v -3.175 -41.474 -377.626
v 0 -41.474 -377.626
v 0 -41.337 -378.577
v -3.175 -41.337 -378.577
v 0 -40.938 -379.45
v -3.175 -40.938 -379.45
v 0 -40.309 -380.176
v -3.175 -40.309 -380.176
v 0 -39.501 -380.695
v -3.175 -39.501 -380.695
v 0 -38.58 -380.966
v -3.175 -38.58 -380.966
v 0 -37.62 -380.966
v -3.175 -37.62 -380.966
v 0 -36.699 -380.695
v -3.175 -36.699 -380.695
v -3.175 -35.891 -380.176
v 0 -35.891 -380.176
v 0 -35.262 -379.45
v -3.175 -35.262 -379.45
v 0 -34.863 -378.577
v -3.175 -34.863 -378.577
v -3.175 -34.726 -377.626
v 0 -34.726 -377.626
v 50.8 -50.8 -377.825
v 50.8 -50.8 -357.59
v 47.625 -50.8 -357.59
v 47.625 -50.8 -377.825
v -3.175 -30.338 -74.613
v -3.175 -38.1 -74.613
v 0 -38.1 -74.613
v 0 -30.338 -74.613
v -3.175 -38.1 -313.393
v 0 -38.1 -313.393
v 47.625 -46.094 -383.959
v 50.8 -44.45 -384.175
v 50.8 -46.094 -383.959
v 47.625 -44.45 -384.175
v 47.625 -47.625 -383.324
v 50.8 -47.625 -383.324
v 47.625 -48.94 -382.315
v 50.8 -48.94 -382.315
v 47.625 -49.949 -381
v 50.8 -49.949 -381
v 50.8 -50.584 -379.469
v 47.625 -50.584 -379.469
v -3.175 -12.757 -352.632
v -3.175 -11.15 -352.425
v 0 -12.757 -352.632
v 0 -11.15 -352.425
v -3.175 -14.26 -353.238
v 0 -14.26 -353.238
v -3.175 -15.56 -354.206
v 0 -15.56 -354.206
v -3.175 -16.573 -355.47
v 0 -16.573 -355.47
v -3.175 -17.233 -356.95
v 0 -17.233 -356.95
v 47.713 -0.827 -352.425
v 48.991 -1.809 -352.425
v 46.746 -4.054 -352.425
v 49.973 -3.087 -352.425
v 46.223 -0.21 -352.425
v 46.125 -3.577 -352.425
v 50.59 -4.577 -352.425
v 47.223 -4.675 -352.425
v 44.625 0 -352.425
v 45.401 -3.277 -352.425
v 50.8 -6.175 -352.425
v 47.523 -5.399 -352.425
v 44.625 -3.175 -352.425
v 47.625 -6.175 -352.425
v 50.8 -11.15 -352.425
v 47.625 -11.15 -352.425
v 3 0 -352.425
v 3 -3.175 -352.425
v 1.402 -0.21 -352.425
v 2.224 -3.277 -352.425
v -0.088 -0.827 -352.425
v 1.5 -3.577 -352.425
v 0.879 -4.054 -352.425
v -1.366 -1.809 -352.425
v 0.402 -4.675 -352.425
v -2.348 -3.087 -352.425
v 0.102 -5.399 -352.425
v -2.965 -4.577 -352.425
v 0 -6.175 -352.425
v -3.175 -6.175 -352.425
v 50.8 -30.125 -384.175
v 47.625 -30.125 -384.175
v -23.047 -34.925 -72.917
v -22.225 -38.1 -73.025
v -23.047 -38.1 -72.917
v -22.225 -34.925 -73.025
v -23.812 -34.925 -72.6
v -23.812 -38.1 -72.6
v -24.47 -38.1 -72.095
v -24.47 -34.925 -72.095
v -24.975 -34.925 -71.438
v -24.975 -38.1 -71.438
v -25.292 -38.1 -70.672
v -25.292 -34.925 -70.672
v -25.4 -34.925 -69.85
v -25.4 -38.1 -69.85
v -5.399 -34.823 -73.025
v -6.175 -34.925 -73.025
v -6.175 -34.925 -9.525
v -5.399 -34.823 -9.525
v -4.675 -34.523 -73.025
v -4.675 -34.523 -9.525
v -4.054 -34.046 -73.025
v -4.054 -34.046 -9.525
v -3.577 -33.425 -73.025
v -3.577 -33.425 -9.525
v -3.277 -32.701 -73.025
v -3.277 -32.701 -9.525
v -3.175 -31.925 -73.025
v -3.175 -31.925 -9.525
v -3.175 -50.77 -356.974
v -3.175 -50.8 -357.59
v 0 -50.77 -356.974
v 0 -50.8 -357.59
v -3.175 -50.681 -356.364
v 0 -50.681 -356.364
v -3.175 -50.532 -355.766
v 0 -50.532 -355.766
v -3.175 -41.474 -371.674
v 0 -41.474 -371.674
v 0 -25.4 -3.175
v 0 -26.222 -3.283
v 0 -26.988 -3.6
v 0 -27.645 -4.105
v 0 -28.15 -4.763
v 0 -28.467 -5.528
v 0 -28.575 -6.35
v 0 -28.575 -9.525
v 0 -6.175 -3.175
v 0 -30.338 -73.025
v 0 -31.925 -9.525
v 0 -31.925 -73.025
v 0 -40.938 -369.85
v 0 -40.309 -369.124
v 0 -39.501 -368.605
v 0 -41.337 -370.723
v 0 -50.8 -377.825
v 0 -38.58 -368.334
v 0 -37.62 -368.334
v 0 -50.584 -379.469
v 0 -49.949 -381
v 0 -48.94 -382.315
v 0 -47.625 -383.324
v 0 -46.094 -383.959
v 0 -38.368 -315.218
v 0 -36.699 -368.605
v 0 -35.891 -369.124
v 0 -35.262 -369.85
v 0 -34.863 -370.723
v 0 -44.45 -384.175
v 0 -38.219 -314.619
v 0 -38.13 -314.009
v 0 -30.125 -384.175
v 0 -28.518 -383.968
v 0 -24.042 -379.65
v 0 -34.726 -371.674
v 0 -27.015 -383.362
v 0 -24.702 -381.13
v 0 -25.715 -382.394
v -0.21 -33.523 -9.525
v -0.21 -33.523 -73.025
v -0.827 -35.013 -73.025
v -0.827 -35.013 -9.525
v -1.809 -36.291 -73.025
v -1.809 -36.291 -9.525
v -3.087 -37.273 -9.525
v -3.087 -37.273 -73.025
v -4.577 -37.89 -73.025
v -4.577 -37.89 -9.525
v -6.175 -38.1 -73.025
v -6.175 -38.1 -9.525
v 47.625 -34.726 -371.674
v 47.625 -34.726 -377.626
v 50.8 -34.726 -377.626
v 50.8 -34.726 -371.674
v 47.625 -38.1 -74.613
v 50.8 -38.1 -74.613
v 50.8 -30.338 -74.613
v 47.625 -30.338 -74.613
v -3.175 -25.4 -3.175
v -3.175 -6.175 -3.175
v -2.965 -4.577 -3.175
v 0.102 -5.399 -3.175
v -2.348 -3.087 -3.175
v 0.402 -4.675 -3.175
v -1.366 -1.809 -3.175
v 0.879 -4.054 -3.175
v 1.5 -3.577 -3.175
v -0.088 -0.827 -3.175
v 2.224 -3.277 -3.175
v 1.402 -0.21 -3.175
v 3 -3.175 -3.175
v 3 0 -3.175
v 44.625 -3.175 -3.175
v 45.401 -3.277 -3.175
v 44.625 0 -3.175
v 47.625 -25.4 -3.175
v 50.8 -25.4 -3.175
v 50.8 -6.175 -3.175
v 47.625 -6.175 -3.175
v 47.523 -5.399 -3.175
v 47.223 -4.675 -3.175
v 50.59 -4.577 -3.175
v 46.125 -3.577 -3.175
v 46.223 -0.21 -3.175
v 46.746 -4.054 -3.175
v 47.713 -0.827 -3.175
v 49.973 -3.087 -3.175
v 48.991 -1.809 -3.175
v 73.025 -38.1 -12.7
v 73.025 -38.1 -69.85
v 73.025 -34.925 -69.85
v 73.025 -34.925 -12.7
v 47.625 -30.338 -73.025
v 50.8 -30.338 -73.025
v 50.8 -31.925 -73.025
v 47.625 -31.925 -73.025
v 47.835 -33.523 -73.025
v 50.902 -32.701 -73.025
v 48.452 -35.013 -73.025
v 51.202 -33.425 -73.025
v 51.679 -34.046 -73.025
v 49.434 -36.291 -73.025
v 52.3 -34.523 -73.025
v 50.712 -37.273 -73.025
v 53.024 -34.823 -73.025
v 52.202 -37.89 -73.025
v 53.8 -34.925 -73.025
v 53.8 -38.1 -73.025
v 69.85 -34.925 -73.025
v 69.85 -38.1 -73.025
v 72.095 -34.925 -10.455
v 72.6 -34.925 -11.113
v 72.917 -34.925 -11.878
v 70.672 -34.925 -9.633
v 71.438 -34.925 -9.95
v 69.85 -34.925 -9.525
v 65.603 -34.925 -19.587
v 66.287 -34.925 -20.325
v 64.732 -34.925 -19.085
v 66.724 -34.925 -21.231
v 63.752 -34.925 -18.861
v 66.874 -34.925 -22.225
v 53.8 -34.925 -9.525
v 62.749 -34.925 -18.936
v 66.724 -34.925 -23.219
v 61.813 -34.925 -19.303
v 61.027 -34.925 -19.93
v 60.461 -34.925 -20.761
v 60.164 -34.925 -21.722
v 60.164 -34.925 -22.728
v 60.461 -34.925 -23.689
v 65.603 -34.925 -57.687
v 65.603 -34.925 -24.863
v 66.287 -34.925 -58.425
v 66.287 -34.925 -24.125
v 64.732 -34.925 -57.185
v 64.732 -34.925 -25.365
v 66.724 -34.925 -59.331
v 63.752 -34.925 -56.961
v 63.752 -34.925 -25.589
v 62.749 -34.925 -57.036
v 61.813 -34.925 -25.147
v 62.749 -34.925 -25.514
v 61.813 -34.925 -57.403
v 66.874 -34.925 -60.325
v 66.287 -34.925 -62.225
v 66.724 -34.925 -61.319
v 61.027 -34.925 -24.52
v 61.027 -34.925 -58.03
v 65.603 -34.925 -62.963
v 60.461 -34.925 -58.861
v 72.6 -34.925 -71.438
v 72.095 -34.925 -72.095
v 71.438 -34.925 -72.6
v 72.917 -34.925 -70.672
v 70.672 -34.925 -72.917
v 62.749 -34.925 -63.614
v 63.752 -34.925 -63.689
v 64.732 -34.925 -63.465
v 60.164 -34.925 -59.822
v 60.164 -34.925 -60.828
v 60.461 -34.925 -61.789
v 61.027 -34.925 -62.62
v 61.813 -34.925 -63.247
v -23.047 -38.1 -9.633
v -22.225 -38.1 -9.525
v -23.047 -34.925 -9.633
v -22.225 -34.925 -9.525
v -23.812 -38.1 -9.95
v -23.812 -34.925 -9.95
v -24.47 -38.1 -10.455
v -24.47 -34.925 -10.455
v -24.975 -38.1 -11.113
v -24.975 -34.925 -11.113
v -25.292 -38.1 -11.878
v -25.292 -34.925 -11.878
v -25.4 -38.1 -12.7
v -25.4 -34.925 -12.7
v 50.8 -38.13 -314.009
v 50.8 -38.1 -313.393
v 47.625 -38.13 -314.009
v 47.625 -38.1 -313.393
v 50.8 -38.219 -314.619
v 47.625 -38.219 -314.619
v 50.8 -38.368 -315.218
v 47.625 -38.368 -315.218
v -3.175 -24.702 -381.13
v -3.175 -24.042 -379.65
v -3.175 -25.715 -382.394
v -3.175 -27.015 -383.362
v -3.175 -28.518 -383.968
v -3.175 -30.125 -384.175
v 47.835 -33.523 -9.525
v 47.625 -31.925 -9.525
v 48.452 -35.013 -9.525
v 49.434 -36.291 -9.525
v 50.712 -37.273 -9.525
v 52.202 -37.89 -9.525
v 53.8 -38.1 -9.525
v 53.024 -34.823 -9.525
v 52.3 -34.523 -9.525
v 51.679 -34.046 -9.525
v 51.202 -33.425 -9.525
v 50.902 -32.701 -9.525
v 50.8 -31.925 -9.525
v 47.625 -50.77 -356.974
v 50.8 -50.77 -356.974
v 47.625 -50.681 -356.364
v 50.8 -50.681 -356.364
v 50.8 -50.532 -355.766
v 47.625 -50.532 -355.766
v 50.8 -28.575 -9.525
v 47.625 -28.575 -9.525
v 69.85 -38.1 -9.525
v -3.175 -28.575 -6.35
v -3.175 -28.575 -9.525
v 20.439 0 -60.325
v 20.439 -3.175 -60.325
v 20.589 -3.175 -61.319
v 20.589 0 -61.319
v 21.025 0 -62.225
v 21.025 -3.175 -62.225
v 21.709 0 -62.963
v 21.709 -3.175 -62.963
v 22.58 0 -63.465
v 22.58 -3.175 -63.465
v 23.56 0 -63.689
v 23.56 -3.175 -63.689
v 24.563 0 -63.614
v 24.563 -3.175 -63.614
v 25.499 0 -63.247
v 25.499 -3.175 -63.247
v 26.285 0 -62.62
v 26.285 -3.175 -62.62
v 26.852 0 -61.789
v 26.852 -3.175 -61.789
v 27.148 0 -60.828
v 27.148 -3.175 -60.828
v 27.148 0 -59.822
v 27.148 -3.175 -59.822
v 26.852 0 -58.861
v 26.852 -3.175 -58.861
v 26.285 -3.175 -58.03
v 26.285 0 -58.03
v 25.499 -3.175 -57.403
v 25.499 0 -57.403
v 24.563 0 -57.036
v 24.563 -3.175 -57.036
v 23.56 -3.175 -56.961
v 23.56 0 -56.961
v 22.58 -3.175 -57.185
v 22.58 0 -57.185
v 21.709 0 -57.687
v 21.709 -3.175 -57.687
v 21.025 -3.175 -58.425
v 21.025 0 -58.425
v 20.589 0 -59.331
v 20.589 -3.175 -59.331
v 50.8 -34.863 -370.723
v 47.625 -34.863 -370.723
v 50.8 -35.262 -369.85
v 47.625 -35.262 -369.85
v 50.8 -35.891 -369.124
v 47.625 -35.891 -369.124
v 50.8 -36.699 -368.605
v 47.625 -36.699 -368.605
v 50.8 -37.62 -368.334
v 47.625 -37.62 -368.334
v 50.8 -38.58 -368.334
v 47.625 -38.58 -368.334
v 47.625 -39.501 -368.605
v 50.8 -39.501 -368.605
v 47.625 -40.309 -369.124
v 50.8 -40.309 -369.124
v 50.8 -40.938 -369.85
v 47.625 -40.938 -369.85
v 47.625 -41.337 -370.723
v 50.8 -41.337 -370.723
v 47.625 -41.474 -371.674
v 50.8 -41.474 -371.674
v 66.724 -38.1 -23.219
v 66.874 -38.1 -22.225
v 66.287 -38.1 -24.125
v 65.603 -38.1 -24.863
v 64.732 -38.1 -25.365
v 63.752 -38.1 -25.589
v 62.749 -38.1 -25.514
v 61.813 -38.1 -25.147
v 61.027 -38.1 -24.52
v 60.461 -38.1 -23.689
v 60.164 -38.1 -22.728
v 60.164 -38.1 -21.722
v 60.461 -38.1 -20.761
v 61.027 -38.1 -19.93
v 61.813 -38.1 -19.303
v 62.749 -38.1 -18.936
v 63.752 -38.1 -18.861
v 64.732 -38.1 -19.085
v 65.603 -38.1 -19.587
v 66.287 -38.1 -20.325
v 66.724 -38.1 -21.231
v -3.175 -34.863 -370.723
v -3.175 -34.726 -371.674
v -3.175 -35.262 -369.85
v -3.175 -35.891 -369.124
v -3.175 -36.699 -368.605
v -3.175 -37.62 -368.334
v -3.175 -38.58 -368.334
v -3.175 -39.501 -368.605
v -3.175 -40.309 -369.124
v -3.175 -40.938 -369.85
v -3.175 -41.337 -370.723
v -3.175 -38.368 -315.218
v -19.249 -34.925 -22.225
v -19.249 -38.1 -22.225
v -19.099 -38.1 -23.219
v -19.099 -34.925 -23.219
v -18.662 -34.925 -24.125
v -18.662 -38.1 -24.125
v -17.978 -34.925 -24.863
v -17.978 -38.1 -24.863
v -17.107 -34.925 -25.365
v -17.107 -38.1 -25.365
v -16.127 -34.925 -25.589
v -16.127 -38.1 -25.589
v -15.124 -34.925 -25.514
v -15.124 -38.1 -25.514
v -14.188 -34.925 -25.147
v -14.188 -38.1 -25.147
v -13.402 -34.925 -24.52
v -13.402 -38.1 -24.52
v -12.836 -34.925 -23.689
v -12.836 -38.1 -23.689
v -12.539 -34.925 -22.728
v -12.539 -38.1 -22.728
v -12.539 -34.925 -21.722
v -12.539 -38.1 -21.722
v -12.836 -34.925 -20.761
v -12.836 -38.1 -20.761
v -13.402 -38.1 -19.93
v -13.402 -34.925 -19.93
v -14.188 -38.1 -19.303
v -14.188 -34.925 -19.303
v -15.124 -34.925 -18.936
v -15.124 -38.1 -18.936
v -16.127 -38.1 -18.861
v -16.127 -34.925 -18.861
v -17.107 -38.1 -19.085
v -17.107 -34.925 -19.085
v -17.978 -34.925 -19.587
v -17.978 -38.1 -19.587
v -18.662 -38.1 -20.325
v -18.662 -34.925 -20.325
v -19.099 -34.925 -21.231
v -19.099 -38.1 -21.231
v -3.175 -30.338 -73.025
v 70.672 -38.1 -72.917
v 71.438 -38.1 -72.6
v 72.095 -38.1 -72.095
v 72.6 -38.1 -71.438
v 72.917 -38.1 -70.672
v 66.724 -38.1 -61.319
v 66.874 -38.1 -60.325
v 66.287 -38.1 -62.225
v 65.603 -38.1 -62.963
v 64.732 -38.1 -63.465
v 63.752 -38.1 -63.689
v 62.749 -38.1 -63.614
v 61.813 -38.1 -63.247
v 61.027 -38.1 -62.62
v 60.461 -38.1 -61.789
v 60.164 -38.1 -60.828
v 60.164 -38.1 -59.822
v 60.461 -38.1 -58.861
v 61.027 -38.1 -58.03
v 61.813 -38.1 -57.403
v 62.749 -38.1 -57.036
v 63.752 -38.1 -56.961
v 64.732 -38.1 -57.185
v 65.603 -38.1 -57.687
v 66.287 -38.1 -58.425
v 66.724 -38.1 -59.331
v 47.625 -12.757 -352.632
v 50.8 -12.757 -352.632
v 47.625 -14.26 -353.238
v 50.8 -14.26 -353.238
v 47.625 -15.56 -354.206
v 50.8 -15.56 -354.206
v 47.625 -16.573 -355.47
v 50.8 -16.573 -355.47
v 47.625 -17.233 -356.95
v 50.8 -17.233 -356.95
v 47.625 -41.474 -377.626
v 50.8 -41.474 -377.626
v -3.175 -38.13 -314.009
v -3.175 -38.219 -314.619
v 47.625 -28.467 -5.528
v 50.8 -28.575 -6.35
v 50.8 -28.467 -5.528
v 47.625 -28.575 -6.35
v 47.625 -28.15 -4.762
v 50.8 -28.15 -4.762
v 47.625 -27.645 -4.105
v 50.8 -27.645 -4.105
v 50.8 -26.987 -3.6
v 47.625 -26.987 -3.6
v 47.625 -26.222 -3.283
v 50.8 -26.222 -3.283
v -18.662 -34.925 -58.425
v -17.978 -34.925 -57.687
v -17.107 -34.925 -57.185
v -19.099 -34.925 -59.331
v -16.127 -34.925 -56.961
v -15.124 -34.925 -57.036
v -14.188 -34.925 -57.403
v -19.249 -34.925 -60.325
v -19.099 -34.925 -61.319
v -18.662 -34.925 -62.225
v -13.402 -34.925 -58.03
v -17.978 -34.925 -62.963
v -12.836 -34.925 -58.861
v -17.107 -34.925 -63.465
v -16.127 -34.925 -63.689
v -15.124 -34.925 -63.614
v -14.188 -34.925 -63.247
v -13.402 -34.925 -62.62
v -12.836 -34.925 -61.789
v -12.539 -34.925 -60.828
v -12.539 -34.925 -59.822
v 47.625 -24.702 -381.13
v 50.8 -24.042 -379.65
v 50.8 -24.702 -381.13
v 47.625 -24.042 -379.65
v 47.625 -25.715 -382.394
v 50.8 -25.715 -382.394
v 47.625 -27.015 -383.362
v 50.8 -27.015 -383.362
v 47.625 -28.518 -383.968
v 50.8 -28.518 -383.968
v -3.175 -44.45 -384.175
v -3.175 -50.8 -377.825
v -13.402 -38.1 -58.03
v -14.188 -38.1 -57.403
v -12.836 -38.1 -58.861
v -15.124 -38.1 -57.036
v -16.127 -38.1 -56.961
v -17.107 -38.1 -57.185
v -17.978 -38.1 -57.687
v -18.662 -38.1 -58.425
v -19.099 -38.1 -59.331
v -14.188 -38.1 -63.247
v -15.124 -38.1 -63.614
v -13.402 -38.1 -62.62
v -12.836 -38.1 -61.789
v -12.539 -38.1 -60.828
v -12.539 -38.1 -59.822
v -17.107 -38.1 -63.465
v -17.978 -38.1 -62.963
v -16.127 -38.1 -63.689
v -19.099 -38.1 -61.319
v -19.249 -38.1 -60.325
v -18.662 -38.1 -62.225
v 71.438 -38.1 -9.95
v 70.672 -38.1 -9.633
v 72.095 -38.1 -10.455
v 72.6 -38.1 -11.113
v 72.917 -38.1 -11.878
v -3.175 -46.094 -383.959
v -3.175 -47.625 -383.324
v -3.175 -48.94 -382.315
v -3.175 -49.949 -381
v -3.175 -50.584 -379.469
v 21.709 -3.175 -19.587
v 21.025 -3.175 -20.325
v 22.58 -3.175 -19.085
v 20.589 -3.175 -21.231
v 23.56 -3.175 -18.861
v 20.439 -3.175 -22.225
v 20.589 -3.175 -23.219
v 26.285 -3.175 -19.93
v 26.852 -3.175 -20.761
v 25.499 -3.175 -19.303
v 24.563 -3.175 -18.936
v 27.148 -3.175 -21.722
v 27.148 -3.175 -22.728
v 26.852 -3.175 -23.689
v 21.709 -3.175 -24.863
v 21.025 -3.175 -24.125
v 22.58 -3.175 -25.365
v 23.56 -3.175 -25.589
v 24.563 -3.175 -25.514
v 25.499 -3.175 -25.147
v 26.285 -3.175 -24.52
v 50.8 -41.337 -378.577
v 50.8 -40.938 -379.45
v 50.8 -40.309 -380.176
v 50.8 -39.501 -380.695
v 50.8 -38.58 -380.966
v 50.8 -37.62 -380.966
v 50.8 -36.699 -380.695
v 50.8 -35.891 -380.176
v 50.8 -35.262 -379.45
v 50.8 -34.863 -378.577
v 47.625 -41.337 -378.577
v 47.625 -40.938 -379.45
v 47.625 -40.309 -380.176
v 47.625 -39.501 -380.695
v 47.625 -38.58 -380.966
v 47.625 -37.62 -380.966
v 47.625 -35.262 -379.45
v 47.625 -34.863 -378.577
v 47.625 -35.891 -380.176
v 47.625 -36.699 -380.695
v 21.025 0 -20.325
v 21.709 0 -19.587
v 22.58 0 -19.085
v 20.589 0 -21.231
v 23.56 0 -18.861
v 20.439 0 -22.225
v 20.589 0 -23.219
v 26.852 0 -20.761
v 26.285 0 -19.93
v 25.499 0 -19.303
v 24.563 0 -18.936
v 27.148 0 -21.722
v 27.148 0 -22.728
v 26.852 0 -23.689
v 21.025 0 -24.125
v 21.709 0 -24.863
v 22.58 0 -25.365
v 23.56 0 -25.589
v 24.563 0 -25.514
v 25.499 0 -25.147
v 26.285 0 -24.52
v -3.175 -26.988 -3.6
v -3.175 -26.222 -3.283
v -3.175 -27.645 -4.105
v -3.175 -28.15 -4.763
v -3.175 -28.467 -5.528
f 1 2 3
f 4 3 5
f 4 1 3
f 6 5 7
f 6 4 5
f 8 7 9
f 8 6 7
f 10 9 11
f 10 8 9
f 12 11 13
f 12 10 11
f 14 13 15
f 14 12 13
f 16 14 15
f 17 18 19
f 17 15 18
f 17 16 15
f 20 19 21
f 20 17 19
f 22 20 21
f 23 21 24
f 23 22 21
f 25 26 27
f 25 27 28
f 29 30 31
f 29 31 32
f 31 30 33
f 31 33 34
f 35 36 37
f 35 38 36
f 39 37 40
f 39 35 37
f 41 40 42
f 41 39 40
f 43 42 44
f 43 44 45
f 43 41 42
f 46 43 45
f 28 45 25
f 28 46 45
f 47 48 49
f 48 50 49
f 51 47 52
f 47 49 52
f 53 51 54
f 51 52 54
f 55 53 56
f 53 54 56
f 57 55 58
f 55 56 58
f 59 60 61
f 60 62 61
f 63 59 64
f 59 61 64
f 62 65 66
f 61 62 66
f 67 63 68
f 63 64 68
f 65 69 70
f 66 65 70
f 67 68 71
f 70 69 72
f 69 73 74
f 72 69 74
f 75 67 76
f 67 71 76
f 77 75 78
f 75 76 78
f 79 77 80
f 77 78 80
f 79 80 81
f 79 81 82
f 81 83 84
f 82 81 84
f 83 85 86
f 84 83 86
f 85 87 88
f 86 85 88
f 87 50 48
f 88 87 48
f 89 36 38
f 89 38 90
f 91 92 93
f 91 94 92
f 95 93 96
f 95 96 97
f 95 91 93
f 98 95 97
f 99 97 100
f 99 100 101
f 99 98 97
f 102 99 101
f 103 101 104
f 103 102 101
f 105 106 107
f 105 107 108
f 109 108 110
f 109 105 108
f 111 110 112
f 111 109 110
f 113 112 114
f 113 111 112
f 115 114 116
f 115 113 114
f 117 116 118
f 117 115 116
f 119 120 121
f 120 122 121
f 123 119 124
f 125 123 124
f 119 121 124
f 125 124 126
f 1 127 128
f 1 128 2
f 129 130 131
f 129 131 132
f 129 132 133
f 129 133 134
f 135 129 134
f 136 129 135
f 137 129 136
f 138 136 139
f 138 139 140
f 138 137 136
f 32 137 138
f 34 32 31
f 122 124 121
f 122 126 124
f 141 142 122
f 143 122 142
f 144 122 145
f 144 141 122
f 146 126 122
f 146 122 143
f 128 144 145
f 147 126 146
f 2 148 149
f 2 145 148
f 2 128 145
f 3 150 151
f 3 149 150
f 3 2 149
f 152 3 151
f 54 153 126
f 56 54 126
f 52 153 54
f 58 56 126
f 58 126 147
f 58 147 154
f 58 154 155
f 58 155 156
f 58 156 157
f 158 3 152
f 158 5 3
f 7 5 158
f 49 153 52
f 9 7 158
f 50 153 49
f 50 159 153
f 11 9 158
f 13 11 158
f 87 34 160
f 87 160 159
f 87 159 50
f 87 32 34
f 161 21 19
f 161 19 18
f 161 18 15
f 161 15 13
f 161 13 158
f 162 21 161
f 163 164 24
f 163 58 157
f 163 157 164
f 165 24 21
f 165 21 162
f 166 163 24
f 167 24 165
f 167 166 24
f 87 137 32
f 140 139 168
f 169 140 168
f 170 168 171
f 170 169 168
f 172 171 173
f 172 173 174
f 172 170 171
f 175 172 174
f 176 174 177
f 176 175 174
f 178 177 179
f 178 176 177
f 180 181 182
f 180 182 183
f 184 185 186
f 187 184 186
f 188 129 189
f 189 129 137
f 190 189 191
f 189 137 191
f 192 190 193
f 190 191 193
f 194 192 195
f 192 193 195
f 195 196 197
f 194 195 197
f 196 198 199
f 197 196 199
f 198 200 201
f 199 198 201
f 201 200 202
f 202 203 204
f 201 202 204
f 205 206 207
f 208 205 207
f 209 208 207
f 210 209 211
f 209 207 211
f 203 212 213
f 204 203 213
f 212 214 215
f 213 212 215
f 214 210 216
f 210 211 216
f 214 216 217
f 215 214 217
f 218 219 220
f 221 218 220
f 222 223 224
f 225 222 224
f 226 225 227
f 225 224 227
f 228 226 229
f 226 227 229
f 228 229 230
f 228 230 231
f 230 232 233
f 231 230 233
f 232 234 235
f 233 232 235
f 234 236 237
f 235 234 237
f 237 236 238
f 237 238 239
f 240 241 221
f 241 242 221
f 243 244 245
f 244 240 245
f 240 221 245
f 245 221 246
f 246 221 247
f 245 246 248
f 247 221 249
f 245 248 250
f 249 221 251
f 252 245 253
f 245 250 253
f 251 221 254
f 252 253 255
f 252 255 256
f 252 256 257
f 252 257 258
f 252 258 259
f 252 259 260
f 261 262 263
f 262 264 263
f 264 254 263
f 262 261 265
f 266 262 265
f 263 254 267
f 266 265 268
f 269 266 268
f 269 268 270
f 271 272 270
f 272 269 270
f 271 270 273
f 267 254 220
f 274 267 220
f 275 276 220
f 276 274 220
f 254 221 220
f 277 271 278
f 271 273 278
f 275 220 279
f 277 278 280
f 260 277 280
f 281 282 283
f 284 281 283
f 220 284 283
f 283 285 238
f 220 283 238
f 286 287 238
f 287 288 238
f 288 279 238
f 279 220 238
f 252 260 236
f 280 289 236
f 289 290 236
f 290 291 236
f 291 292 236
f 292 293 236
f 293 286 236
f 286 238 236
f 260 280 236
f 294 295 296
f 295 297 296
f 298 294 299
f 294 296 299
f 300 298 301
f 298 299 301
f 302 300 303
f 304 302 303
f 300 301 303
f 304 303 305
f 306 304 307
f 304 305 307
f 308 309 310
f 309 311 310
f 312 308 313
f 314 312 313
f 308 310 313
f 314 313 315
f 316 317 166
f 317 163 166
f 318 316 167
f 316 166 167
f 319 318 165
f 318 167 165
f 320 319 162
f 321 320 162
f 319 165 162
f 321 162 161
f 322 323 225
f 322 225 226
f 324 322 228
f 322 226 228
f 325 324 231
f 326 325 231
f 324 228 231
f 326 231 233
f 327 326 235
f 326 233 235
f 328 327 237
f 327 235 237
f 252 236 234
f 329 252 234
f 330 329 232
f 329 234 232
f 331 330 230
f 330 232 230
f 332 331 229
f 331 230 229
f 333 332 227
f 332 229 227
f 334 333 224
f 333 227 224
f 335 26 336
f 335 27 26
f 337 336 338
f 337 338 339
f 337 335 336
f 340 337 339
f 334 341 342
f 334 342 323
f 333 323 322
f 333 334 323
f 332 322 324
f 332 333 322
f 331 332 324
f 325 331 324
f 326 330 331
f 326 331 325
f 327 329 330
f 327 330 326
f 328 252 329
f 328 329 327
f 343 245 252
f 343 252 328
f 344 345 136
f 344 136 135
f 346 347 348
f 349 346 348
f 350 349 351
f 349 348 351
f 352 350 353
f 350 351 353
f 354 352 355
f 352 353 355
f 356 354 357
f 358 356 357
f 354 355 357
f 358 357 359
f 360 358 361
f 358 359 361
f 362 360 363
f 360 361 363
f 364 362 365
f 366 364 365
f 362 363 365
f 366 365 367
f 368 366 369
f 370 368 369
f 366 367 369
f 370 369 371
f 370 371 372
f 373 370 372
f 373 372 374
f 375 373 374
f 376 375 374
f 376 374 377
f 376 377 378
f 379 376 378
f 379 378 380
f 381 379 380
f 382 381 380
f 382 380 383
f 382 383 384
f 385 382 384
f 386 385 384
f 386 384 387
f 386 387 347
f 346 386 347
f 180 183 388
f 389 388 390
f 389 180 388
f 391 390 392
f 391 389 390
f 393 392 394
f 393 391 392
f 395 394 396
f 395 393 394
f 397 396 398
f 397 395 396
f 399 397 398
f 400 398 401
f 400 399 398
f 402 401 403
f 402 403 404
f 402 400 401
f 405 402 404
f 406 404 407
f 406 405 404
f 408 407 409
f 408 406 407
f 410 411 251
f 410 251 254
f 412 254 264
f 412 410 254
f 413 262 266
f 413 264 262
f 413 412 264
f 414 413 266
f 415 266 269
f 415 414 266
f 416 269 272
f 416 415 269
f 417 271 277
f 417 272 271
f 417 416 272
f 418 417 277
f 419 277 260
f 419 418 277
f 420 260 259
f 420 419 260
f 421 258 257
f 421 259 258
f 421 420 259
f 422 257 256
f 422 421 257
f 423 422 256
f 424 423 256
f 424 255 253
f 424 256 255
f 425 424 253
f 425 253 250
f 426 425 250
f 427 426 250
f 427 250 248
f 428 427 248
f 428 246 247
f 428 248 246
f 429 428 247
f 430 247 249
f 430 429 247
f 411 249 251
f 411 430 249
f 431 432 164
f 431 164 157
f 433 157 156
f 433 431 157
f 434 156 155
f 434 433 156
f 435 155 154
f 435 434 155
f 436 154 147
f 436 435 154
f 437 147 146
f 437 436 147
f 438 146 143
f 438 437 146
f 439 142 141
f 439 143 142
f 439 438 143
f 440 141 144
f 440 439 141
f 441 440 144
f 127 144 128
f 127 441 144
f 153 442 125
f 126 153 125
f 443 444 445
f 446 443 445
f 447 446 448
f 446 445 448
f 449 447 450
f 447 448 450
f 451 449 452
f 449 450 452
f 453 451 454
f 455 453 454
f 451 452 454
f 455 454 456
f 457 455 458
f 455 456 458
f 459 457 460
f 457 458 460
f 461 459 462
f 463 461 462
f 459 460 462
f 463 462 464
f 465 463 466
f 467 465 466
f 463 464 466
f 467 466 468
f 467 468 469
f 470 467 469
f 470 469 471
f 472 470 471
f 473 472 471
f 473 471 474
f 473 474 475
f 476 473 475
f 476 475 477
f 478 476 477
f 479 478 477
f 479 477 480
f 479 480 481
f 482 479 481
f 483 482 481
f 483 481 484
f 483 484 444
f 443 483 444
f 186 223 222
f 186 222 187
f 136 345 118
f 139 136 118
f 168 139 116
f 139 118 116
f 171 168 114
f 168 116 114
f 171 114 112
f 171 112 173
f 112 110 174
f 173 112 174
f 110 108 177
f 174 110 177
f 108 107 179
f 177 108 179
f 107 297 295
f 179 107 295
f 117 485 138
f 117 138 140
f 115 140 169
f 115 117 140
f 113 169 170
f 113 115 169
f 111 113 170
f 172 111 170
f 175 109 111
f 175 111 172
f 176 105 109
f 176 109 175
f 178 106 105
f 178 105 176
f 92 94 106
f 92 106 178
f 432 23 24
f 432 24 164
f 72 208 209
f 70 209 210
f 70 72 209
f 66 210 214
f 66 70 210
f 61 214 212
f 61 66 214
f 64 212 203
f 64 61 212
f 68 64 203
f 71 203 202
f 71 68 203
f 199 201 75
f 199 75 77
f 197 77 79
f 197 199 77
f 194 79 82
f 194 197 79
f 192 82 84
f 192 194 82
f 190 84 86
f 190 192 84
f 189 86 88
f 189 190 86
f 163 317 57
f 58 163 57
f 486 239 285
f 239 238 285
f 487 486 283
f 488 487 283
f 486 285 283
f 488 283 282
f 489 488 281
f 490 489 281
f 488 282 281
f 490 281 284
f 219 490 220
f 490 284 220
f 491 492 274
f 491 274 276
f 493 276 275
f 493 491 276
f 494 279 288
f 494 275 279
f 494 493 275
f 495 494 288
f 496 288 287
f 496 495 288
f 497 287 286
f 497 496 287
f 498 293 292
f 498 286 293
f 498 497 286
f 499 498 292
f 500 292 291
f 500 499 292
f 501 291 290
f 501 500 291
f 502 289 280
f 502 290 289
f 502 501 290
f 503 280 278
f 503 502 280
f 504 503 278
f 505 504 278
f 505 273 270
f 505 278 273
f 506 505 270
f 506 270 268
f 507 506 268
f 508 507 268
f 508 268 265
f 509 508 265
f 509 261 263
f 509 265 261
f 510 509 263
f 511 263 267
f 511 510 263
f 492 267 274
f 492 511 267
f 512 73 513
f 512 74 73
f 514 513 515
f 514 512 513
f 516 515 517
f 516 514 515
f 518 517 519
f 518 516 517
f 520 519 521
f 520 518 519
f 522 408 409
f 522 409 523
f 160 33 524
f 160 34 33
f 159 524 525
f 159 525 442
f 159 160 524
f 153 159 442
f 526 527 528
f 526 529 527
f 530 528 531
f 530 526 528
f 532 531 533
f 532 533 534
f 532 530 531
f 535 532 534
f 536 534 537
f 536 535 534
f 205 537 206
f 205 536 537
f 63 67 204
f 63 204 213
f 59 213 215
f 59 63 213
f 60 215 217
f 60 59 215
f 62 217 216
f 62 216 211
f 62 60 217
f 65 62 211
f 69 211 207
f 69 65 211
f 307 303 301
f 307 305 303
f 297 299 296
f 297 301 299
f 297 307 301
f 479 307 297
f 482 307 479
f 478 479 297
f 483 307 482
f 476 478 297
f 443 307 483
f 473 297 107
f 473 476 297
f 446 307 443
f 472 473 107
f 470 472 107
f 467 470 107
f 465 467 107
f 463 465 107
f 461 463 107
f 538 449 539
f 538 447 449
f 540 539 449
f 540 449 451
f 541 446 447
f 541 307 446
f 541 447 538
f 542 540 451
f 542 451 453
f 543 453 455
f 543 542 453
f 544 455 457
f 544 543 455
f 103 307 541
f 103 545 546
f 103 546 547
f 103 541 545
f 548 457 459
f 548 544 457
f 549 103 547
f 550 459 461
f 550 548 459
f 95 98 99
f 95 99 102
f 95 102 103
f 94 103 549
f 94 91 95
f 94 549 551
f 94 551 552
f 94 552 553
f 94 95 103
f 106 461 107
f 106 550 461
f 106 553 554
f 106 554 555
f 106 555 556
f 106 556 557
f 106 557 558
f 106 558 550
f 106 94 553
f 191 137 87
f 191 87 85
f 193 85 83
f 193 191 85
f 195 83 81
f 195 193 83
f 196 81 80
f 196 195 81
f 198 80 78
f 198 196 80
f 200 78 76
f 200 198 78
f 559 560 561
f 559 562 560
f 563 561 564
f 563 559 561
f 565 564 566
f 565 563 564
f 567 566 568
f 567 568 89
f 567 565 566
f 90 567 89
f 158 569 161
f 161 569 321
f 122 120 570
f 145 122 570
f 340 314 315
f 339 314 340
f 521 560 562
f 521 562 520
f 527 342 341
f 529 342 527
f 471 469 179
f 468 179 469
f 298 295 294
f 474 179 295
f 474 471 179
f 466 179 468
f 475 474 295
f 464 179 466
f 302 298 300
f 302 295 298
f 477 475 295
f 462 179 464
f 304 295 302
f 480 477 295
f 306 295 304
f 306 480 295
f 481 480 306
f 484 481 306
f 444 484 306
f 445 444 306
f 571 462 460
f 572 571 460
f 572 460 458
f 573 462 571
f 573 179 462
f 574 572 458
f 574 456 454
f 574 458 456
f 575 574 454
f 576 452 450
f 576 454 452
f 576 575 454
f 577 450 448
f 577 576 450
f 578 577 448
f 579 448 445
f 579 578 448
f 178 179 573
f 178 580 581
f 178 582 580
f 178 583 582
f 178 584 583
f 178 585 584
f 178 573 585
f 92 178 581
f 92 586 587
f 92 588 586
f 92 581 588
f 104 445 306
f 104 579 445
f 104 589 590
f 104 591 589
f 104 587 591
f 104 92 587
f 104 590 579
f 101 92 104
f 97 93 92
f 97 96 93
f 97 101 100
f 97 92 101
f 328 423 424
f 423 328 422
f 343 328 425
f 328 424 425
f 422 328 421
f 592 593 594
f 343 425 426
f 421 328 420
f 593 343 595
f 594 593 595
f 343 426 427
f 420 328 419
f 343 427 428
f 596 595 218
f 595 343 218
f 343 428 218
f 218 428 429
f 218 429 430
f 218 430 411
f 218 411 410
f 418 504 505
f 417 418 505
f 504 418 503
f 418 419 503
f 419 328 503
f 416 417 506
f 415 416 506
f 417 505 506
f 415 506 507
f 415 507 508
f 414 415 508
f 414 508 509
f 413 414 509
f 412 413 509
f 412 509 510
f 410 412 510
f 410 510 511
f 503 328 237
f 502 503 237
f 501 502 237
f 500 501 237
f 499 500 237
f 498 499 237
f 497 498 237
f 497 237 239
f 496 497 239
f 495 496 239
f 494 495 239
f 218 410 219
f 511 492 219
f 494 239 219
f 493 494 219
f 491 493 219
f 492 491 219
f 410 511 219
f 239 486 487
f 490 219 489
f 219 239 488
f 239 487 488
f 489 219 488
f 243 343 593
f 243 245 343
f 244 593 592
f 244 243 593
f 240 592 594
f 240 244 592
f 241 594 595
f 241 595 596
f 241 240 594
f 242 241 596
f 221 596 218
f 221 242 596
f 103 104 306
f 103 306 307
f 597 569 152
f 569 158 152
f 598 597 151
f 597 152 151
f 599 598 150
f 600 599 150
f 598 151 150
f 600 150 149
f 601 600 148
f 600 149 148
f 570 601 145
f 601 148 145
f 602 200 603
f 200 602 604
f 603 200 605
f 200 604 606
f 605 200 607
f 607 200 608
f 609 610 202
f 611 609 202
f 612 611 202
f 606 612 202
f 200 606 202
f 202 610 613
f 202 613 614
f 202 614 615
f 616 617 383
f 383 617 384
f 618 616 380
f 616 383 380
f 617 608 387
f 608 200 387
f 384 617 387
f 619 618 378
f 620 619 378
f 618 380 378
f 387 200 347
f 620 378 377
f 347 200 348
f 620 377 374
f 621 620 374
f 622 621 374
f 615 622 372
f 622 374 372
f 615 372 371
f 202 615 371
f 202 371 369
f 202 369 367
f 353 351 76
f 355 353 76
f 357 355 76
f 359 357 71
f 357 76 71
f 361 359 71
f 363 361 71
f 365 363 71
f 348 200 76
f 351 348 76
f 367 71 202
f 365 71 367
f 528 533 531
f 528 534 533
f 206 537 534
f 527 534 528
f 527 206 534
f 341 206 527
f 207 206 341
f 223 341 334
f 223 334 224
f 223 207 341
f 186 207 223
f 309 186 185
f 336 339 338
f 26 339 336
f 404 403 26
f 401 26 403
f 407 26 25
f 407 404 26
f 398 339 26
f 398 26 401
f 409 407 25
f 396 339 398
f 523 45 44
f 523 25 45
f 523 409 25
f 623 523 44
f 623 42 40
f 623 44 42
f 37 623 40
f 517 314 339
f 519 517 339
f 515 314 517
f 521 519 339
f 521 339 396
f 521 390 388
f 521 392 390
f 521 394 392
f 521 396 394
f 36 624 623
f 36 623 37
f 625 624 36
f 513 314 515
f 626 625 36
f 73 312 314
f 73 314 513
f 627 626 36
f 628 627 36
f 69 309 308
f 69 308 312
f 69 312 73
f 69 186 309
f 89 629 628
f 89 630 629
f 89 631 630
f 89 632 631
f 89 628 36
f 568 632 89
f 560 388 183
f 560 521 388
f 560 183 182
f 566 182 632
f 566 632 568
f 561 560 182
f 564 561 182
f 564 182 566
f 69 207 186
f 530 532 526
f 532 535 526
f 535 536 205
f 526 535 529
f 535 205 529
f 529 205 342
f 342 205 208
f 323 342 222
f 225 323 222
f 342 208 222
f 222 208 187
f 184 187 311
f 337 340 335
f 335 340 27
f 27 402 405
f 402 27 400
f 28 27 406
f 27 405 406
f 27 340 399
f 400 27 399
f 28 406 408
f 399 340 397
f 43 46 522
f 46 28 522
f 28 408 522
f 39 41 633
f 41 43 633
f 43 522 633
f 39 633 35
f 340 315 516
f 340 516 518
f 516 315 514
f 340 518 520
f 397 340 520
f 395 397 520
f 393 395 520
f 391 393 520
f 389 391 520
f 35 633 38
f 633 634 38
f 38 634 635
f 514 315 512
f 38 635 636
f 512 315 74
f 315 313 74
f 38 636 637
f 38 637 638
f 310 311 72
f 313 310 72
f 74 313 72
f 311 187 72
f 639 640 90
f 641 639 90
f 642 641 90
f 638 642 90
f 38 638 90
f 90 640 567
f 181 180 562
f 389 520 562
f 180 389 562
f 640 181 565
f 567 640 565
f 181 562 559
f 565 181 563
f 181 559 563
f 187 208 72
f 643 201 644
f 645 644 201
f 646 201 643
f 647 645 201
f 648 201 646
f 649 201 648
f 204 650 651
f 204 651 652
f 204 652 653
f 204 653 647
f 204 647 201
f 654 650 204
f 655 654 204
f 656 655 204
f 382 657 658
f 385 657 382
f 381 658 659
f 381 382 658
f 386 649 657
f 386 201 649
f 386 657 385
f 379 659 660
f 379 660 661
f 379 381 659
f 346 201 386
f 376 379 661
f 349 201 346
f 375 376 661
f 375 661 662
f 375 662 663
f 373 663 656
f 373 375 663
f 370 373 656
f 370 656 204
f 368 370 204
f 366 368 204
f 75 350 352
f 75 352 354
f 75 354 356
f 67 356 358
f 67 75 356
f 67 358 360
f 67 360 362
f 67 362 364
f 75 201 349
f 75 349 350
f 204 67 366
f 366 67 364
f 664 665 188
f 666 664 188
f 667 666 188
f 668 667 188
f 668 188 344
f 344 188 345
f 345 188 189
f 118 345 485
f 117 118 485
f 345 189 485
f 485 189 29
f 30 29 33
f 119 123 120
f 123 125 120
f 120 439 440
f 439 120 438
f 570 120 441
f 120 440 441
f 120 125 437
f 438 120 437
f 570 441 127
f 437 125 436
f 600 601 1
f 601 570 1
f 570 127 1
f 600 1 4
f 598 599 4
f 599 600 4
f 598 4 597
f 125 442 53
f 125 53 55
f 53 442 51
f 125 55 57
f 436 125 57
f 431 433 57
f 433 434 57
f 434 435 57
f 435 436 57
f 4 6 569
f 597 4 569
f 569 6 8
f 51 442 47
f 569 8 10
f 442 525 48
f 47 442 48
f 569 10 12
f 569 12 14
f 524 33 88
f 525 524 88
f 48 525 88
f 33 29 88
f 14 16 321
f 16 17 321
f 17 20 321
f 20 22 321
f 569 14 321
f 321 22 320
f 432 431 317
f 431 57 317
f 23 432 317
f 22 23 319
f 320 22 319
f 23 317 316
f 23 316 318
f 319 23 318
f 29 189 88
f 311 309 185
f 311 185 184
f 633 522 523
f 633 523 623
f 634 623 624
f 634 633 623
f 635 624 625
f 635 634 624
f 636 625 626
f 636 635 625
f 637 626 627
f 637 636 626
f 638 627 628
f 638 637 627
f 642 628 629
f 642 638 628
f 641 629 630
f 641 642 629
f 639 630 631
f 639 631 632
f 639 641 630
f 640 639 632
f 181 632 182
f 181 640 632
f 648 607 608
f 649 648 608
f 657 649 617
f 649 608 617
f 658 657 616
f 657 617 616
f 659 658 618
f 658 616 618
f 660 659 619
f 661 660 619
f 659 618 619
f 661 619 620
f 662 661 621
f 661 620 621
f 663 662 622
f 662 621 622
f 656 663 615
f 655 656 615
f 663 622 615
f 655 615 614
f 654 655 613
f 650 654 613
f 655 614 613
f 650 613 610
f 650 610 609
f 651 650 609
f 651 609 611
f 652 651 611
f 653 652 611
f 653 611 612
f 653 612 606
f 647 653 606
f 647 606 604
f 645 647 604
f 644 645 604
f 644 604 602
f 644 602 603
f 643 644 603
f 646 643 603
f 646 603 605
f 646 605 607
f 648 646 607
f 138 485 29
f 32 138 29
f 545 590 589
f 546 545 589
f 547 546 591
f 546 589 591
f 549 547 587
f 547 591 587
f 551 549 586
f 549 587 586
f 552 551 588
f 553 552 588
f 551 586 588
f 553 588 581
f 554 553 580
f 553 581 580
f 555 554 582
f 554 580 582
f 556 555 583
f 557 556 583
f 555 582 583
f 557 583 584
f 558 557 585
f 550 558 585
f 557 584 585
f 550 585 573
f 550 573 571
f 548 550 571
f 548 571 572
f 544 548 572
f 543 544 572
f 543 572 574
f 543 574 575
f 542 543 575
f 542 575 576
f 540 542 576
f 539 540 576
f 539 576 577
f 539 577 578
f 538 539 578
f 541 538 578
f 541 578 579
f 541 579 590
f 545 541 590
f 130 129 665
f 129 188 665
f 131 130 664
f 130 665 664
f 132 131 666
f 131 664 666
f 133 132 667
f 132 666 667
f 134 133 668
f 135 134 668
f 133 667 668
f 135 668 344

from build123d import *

# Parameters (mm, degrees)
SKETCH1_W                            = 47.625
SKETCH1_H                            = 352.425
BASE_FLANGE1_DEPTH                   = 3.175
EDGE_FLANGE1_STRIP_W                 = 18.7
EDGE_FLANGE1_STRIP_H                 = 3.175
EDGE_FLANGE1_STRIP_CUT_DEPTH         = 352.425
EDGE_FLANGE1_DEPTH                   = 352.425
EDGE_FLANGE2_STRIP_W                 = 18.7
EDGE_FLANGE2_STRIP_H                 = 3.175
EDGE_FLANGE2_STRIP_CUT_DEPTH         = 352.425
EDGE_FLANGE2_DEPTH                   = 352.425
BOSS_EXTRUDE1_DEPTH                  = 3.175
BOSS_EXTRUDE2_DEPTH                  = 3.175
F_17_64_START                        = -3.175
F_17_64_0_26563_DIAMETER_SLOT1_DEPTH = 53.975
F_17_64_0_26563_DIAMETER_HOLE2_D     = 6.747002
SKETCH21_W                           = 9.525
SKETCH21_H                           = 9.525
CUT_EXTRUDE1_DEPTH                   = 392.259979106
EDGE_FLANGE5_STRIP_W                 = 18.7
EDGE_FLANGE5_STRIP_H                 = 3.175
EDGE_FLANGE5_STRIP_CUT_DEPTH         = 63.5
EDGE_FLANGE5_RELIEF_W                = 20.2875
EDGE_FLANGE5_RELIEF_H                = 1.5875
EDGE_FLANGE5_RELIEF_CUT_DEPTH        = 3.175
EDGE_FLANGE5_DEPTH                   = 63.5
FILLET2_R                            = 6.35
F_17_64_0_26563_DIAMETER_HOLE3_D     = 6.747002
FILLET3_R                            = 3.175
CUT_EXTRUDE3_DEPTH                   = 395.939882292
CUT_EXTRUDE3_DEPTH_BACK              = 395.939882292
SKETCH30_W                           = 3.175
SKETCH30_H                           = 28.575
FILLET4_R                            = 3.175


# Read off the part's stored shape, not the designer's step: 17/64 (0.26563) Diameter Slot1
# Sheet-metal steps are written as plain solids
with BuildPart() as part:
    # Sketch1 → Base-Flange1 (new body)
    with BuildSketch(Plane(origin=(0, 0, 0), x_dir=(1, 0, 0), z_dir=(0, 1, 0))):
        with Locations((23.8125, 176.2125)):
            Rectangle(SKETCH1_W, SKETCH1_H)
    extrude(amount=-BASE_FLANGE1_DEPTH)

    # Edge-Flange1 strip (across the edge) → Edge-Flange1 strip cut (cut)
    with BuildSketch(Plane(origin=(47.625, -3.175, -352.425), x_dir=(-1, 0, 0), z_dir=(0, 0, 1))):
        with Locations((-6.35, -1.5875)):
            Rectangle(EDGE_FLANGE1_STRIP_W, EDGE_FLANGE1_STRIP_H)
    extrude(amount=EDGE_FLANGE1_STRIP_CUT_DEPTH, mode=Mode.SUBTRACT)

    # Edge-Flange1 section (across the edge) → Edge-Flange1 (add)
    with BuildSketch(Plane(origin=(47.625, -3.175, -352.425), x_dir=(-1, 0, 0), z_dir=(0, 0, 1))):
        with BuildLine():
            Line((-3.175, 3), (-3.175, 34.925))
            Line((-3.175, 34.925), (0, 34.925))
            Line((0, 34.925), (0, 3))
            ThreePointArc((0, 3), (0.878679656, 0.878679656), (3, 0))
            Line((3, 0), (3, -3.175))
            ThreePointArc((3, -3.175), (-1.366384374, -1.366384374), (-3.175, 3))
        make_face()
    extrude(amount=EDGE_FLANGE1_DEPTH)

    # Edge-Flange2 strip (across the edge) → Edge-Flange2 strip cut (cut)
    with BuildSketch(Plane(origin=(0, -3.175, 0), x_dir=(1, 0, 0), z_dir=(0, 0, -1))):
        with Locations((-6.35, -1.5875)):
            Rectangle(EDGE_FLANGE2_STRIP_W, EDGE_FLANGE2_STRIP_H)
    extrude(amount=EDGE_FLANGE2_STRIP_CUT_DEPTH, mode=Mode.SUBTRACT)

    # Edge-Flange2 section (across the edge) → Edge-Flange2 (add)
    with BuildSketch(Plane(origin=(0, -3.175, 0), x_dir=(1, 0, 0), z_dir=(0, 0, -1))):
        with BuildLine():
            Line((-3.175, 3), (-3.175, 34.925))
            Line((-3.175, 34.925), (0, 34.925))
            Line((0, 34.925), (0, 3))
            ThreePointArc((0, 3), (0.878679656, 0.878679656), (3, 0))
            Line((3, 0), (3, -3.175))
            ThreePointArc((3, -3.175), (-1.366384374, -1.366384374), (-3.175, 3))
        make_face()
    extrude(amount=EDGE_FLANGE2_DEPTH)

    # Sketch12 → Boss-Extrude1 (add)
    with BuildSketch(Plane.ZY.offset(3.175)):
        Polygon((-384.175, -50.8), (-384.175, -25.4), (-352.425, -15.875), (-352.425, -38.1), (-314.325, -38.1), (-356.658333333, -50.8), align=None)
    extrude(amount=-BOSS_EXTRUDE1_DEPTH)

    # Sketch13 → Boss-Extrude2 (add)
    with BuildSketch(Plane(origin=(50.8, 0, 0), x_dir=(0, 0, -1), z_dir=(1, 0, 0))):
        Polygon((352.425, -15.875), (352.425, -38.1), (314.325, -38.1), (356.658333333, -50.8), (384.175, -50.8), (384.175, -25.4), align=None)
    extrude(amount=-BOSS_EXTRUDE2_DEPTH)

    # 17/64 (0.26563) Diameter Slot1 outline → 17/64 (0.26563) Diameter Slot1 (cut)
    with BuildSketch(Plane.YZ.offset(F_17_64_START)):
        with BuildLine():
            ThreePointArc((-41.473501, -377.626499), (-38.1, -381), (-34.726499, -377.626499))
            Line((-34.726499, -377.626499), (-34.726499, -371.673501))
            ThreePointArc((-34.726499, -371.673501), (-38.1, -368.3), (-41.473501, -371.673501))
            Line((-41.473501, -371.673501), (-41.473501, -377.626499))
        make_face()
    extrude(amount=F_17_64_0_26563_DIAMETER_SLOT1_DEPTH, mode=Mode.SUBTRACT)

    # 17/64 (0.26563) Diameter Hole2 (through all)
    with Locations(Plane(origin=(0, 0, 0), x_dir=(1, 0, 0), z_dir=(0, 1, 0))):
        with Locations((23.8125, 22.225), (23.8125, 60.325)):
            Hole(F_17_64_0_26563_DIAMETER_HOLE2_D / 2)

    # Sketch21 → Cut-Extrude1 (cut, through all)
    with BuildSketch(Plane.ZY.offset(3.175)):
        with Locations((-4.7625, -33.3375)):
            Rectangle(SKETCH21_W, SKETCH21_H)
    extrude(amount=-CUT_EXTRUDE1_DEPTH, mode=Mode.SUBTRACT)

    # Edge-Flange5 strip (across the edge) → Edge-Flange5 strip cut (cut)
    with BuildSketch(Plane(origin=(-3.175, -38.1, -73.025), x_dir=(0, 1, 0), z_dir=(0, 0, 1))):
        with Locations((-3.175, -1.5875)):
            Rectangle(EDGE_FLANGE5_STRIP_W, EDGE_FLANGE5_STRIP_H)
    edge_flange5_strip_cut = extrude(amount=EDGE_FLANGE5_STRIP_CUT_DEPTH, mode=Mode.SUBTRACT)

    # Edge-Flange5 relief (on the sheet) → Edge-Flange5 relief cut (cut)
    with BuildSketch(Plane(origin=(-3.175, -31.925, -73.025), x_dir=(0, 1, 0), z_dir=(-1, 0, 0))):
        with Locations((-8.55625, 0.79375)):
            Rectangle(EDGE_FLANGE5_RELIEF_W, EDGE_FLANGE5_RELIEF_H)
    edge_flange5_relief_cut = extrude(amount=-EDGE_FLANGE5_RELIEF_CUT_DEPTH, mode=Mode.SUBTRACT)

    # Edge-Flange5 section (across the edge) → Edge-Flange5 (add)
    with BuildSketch(Plane(origin=(-3.175, -38.1, -73.025), x_dir=(0, 1, 0), z_dir=(0, 0, 1))):
        with BuildLine():
            Line((0, 3), (0, 22.225))
            Line((0, 22.225), (3.175, 22.225))
            Line((3.175, 22.225), (3.175, 3))
            ThreePointArc((3.175, 3), (4.053679656, 0.878679656), (6.175, 0))
            Line((6.175, 0), (6.175, -3.175))
            ThreePointArc((6.175, -3.175), (1.808615626, -1.366384374), (0, 3))
        make_face()
    edge_flange5 = extrude(amount=EDGE_FLANGE5_DEPTH)

    # Fillet2
    fillet2_edges = [part.edges().sort_by_distance(p)[0] for p in [
        (-1.5875, -38.1, -314.325),
        (-1.5875, -50.8, -356.658333333),
        (-1.5875, -50.8, -384.175),
        (-1.5875, -25.4, -384.175),
        (-1.5875, -15.875, -352.425),
        (49.2125, -38.1, -314.325),
        (49.2125, -15.875, -352.425),
        (49.2125, -25.4, -384.175),
        (49.2125, -50.8, -384.175),
        (49.2125, -50.8, -356.658333333),
    ]]
    fillet(fillet2_edges, radius=FILLET2_R)

    # Mirror1: Edge-Flange5 strip cut, Edge-Flange5 relief cut, Edge-Flange5 across plane
    add(edge_flange5_strip_cut.mirror(Plane.ZY.offset(-23.8125)), mode=Mode.SUBTRACT)
    add(edge_flange5_relief_cut.mirror(Plane.ZY.offset(-23.8125)), mode=Mode.SUBTRACT)
    add(edge_flange5.mirror(Plane.ZY.offset(-23.8125)))

    # 17/64 (0.26563) Diameter Hole3 (through all)
    with Locations(Plane(origin=(0, -34.925, 0), x_dir=(1, 0, 0), z_dir=(0, 1, 0))):
        with Locations((-15.875, 60.325), (-15.875, 22.225)):
            f_17_64_0_26563_diameter_hole3 = Hole(F_17_64_0_26563_DIAMETER_HOLE3_D / 2)

    # Mirror2: 17/64 (0.26563) Diameter Hole3 across plane
    add(f_17_64_0_26563_diameter_hole3.mirror(Plane.ZY.offset(-23.8125)), mode=Mode.SUBTRACT)

    # Fillet3
    fillet3_edges = [part.edges().sort_by_distance(p)[0] for p in [
        (-25.4, -36.5125, -73.025),
        (-25.4, -36.5125, -9.525),
        (73.025, -36.5125, -9.525),
        (73.025, -36.5125, -73.025),
    ]]
    fillet(fillet3_edges, radius=FILLET3_R)

    # Sketch30 → Cut-Extrude3 (cut, two sides: drawn at the far end of the back side and taken through both)
    with BuildSketch(Plane.ZY.offset(3.175).offset(-CUT_EXTRUDE3_DEPTH_BACK)):
        with Locations((-1.5875, -14.2875)):
            Rectangle(SKETCH30_W, SKETCH30_H)
    extrude(amount=CUT_EXTRUDE3_DEPTH + CUT_EXTRUDE3_DEPTH_BACK, mode=Mode.SUBTRACT)

    # Fillet4
    fillet4_edges = [part.edges().sort_by_distance(p)[0] for p in [
        (49.2125, -28.575, -3.175),
        (-1.5875, -28.575, -3.175),
    ]]
    fillet(fillet4_edges, radius=FILLET4_R)


solid = part.part
